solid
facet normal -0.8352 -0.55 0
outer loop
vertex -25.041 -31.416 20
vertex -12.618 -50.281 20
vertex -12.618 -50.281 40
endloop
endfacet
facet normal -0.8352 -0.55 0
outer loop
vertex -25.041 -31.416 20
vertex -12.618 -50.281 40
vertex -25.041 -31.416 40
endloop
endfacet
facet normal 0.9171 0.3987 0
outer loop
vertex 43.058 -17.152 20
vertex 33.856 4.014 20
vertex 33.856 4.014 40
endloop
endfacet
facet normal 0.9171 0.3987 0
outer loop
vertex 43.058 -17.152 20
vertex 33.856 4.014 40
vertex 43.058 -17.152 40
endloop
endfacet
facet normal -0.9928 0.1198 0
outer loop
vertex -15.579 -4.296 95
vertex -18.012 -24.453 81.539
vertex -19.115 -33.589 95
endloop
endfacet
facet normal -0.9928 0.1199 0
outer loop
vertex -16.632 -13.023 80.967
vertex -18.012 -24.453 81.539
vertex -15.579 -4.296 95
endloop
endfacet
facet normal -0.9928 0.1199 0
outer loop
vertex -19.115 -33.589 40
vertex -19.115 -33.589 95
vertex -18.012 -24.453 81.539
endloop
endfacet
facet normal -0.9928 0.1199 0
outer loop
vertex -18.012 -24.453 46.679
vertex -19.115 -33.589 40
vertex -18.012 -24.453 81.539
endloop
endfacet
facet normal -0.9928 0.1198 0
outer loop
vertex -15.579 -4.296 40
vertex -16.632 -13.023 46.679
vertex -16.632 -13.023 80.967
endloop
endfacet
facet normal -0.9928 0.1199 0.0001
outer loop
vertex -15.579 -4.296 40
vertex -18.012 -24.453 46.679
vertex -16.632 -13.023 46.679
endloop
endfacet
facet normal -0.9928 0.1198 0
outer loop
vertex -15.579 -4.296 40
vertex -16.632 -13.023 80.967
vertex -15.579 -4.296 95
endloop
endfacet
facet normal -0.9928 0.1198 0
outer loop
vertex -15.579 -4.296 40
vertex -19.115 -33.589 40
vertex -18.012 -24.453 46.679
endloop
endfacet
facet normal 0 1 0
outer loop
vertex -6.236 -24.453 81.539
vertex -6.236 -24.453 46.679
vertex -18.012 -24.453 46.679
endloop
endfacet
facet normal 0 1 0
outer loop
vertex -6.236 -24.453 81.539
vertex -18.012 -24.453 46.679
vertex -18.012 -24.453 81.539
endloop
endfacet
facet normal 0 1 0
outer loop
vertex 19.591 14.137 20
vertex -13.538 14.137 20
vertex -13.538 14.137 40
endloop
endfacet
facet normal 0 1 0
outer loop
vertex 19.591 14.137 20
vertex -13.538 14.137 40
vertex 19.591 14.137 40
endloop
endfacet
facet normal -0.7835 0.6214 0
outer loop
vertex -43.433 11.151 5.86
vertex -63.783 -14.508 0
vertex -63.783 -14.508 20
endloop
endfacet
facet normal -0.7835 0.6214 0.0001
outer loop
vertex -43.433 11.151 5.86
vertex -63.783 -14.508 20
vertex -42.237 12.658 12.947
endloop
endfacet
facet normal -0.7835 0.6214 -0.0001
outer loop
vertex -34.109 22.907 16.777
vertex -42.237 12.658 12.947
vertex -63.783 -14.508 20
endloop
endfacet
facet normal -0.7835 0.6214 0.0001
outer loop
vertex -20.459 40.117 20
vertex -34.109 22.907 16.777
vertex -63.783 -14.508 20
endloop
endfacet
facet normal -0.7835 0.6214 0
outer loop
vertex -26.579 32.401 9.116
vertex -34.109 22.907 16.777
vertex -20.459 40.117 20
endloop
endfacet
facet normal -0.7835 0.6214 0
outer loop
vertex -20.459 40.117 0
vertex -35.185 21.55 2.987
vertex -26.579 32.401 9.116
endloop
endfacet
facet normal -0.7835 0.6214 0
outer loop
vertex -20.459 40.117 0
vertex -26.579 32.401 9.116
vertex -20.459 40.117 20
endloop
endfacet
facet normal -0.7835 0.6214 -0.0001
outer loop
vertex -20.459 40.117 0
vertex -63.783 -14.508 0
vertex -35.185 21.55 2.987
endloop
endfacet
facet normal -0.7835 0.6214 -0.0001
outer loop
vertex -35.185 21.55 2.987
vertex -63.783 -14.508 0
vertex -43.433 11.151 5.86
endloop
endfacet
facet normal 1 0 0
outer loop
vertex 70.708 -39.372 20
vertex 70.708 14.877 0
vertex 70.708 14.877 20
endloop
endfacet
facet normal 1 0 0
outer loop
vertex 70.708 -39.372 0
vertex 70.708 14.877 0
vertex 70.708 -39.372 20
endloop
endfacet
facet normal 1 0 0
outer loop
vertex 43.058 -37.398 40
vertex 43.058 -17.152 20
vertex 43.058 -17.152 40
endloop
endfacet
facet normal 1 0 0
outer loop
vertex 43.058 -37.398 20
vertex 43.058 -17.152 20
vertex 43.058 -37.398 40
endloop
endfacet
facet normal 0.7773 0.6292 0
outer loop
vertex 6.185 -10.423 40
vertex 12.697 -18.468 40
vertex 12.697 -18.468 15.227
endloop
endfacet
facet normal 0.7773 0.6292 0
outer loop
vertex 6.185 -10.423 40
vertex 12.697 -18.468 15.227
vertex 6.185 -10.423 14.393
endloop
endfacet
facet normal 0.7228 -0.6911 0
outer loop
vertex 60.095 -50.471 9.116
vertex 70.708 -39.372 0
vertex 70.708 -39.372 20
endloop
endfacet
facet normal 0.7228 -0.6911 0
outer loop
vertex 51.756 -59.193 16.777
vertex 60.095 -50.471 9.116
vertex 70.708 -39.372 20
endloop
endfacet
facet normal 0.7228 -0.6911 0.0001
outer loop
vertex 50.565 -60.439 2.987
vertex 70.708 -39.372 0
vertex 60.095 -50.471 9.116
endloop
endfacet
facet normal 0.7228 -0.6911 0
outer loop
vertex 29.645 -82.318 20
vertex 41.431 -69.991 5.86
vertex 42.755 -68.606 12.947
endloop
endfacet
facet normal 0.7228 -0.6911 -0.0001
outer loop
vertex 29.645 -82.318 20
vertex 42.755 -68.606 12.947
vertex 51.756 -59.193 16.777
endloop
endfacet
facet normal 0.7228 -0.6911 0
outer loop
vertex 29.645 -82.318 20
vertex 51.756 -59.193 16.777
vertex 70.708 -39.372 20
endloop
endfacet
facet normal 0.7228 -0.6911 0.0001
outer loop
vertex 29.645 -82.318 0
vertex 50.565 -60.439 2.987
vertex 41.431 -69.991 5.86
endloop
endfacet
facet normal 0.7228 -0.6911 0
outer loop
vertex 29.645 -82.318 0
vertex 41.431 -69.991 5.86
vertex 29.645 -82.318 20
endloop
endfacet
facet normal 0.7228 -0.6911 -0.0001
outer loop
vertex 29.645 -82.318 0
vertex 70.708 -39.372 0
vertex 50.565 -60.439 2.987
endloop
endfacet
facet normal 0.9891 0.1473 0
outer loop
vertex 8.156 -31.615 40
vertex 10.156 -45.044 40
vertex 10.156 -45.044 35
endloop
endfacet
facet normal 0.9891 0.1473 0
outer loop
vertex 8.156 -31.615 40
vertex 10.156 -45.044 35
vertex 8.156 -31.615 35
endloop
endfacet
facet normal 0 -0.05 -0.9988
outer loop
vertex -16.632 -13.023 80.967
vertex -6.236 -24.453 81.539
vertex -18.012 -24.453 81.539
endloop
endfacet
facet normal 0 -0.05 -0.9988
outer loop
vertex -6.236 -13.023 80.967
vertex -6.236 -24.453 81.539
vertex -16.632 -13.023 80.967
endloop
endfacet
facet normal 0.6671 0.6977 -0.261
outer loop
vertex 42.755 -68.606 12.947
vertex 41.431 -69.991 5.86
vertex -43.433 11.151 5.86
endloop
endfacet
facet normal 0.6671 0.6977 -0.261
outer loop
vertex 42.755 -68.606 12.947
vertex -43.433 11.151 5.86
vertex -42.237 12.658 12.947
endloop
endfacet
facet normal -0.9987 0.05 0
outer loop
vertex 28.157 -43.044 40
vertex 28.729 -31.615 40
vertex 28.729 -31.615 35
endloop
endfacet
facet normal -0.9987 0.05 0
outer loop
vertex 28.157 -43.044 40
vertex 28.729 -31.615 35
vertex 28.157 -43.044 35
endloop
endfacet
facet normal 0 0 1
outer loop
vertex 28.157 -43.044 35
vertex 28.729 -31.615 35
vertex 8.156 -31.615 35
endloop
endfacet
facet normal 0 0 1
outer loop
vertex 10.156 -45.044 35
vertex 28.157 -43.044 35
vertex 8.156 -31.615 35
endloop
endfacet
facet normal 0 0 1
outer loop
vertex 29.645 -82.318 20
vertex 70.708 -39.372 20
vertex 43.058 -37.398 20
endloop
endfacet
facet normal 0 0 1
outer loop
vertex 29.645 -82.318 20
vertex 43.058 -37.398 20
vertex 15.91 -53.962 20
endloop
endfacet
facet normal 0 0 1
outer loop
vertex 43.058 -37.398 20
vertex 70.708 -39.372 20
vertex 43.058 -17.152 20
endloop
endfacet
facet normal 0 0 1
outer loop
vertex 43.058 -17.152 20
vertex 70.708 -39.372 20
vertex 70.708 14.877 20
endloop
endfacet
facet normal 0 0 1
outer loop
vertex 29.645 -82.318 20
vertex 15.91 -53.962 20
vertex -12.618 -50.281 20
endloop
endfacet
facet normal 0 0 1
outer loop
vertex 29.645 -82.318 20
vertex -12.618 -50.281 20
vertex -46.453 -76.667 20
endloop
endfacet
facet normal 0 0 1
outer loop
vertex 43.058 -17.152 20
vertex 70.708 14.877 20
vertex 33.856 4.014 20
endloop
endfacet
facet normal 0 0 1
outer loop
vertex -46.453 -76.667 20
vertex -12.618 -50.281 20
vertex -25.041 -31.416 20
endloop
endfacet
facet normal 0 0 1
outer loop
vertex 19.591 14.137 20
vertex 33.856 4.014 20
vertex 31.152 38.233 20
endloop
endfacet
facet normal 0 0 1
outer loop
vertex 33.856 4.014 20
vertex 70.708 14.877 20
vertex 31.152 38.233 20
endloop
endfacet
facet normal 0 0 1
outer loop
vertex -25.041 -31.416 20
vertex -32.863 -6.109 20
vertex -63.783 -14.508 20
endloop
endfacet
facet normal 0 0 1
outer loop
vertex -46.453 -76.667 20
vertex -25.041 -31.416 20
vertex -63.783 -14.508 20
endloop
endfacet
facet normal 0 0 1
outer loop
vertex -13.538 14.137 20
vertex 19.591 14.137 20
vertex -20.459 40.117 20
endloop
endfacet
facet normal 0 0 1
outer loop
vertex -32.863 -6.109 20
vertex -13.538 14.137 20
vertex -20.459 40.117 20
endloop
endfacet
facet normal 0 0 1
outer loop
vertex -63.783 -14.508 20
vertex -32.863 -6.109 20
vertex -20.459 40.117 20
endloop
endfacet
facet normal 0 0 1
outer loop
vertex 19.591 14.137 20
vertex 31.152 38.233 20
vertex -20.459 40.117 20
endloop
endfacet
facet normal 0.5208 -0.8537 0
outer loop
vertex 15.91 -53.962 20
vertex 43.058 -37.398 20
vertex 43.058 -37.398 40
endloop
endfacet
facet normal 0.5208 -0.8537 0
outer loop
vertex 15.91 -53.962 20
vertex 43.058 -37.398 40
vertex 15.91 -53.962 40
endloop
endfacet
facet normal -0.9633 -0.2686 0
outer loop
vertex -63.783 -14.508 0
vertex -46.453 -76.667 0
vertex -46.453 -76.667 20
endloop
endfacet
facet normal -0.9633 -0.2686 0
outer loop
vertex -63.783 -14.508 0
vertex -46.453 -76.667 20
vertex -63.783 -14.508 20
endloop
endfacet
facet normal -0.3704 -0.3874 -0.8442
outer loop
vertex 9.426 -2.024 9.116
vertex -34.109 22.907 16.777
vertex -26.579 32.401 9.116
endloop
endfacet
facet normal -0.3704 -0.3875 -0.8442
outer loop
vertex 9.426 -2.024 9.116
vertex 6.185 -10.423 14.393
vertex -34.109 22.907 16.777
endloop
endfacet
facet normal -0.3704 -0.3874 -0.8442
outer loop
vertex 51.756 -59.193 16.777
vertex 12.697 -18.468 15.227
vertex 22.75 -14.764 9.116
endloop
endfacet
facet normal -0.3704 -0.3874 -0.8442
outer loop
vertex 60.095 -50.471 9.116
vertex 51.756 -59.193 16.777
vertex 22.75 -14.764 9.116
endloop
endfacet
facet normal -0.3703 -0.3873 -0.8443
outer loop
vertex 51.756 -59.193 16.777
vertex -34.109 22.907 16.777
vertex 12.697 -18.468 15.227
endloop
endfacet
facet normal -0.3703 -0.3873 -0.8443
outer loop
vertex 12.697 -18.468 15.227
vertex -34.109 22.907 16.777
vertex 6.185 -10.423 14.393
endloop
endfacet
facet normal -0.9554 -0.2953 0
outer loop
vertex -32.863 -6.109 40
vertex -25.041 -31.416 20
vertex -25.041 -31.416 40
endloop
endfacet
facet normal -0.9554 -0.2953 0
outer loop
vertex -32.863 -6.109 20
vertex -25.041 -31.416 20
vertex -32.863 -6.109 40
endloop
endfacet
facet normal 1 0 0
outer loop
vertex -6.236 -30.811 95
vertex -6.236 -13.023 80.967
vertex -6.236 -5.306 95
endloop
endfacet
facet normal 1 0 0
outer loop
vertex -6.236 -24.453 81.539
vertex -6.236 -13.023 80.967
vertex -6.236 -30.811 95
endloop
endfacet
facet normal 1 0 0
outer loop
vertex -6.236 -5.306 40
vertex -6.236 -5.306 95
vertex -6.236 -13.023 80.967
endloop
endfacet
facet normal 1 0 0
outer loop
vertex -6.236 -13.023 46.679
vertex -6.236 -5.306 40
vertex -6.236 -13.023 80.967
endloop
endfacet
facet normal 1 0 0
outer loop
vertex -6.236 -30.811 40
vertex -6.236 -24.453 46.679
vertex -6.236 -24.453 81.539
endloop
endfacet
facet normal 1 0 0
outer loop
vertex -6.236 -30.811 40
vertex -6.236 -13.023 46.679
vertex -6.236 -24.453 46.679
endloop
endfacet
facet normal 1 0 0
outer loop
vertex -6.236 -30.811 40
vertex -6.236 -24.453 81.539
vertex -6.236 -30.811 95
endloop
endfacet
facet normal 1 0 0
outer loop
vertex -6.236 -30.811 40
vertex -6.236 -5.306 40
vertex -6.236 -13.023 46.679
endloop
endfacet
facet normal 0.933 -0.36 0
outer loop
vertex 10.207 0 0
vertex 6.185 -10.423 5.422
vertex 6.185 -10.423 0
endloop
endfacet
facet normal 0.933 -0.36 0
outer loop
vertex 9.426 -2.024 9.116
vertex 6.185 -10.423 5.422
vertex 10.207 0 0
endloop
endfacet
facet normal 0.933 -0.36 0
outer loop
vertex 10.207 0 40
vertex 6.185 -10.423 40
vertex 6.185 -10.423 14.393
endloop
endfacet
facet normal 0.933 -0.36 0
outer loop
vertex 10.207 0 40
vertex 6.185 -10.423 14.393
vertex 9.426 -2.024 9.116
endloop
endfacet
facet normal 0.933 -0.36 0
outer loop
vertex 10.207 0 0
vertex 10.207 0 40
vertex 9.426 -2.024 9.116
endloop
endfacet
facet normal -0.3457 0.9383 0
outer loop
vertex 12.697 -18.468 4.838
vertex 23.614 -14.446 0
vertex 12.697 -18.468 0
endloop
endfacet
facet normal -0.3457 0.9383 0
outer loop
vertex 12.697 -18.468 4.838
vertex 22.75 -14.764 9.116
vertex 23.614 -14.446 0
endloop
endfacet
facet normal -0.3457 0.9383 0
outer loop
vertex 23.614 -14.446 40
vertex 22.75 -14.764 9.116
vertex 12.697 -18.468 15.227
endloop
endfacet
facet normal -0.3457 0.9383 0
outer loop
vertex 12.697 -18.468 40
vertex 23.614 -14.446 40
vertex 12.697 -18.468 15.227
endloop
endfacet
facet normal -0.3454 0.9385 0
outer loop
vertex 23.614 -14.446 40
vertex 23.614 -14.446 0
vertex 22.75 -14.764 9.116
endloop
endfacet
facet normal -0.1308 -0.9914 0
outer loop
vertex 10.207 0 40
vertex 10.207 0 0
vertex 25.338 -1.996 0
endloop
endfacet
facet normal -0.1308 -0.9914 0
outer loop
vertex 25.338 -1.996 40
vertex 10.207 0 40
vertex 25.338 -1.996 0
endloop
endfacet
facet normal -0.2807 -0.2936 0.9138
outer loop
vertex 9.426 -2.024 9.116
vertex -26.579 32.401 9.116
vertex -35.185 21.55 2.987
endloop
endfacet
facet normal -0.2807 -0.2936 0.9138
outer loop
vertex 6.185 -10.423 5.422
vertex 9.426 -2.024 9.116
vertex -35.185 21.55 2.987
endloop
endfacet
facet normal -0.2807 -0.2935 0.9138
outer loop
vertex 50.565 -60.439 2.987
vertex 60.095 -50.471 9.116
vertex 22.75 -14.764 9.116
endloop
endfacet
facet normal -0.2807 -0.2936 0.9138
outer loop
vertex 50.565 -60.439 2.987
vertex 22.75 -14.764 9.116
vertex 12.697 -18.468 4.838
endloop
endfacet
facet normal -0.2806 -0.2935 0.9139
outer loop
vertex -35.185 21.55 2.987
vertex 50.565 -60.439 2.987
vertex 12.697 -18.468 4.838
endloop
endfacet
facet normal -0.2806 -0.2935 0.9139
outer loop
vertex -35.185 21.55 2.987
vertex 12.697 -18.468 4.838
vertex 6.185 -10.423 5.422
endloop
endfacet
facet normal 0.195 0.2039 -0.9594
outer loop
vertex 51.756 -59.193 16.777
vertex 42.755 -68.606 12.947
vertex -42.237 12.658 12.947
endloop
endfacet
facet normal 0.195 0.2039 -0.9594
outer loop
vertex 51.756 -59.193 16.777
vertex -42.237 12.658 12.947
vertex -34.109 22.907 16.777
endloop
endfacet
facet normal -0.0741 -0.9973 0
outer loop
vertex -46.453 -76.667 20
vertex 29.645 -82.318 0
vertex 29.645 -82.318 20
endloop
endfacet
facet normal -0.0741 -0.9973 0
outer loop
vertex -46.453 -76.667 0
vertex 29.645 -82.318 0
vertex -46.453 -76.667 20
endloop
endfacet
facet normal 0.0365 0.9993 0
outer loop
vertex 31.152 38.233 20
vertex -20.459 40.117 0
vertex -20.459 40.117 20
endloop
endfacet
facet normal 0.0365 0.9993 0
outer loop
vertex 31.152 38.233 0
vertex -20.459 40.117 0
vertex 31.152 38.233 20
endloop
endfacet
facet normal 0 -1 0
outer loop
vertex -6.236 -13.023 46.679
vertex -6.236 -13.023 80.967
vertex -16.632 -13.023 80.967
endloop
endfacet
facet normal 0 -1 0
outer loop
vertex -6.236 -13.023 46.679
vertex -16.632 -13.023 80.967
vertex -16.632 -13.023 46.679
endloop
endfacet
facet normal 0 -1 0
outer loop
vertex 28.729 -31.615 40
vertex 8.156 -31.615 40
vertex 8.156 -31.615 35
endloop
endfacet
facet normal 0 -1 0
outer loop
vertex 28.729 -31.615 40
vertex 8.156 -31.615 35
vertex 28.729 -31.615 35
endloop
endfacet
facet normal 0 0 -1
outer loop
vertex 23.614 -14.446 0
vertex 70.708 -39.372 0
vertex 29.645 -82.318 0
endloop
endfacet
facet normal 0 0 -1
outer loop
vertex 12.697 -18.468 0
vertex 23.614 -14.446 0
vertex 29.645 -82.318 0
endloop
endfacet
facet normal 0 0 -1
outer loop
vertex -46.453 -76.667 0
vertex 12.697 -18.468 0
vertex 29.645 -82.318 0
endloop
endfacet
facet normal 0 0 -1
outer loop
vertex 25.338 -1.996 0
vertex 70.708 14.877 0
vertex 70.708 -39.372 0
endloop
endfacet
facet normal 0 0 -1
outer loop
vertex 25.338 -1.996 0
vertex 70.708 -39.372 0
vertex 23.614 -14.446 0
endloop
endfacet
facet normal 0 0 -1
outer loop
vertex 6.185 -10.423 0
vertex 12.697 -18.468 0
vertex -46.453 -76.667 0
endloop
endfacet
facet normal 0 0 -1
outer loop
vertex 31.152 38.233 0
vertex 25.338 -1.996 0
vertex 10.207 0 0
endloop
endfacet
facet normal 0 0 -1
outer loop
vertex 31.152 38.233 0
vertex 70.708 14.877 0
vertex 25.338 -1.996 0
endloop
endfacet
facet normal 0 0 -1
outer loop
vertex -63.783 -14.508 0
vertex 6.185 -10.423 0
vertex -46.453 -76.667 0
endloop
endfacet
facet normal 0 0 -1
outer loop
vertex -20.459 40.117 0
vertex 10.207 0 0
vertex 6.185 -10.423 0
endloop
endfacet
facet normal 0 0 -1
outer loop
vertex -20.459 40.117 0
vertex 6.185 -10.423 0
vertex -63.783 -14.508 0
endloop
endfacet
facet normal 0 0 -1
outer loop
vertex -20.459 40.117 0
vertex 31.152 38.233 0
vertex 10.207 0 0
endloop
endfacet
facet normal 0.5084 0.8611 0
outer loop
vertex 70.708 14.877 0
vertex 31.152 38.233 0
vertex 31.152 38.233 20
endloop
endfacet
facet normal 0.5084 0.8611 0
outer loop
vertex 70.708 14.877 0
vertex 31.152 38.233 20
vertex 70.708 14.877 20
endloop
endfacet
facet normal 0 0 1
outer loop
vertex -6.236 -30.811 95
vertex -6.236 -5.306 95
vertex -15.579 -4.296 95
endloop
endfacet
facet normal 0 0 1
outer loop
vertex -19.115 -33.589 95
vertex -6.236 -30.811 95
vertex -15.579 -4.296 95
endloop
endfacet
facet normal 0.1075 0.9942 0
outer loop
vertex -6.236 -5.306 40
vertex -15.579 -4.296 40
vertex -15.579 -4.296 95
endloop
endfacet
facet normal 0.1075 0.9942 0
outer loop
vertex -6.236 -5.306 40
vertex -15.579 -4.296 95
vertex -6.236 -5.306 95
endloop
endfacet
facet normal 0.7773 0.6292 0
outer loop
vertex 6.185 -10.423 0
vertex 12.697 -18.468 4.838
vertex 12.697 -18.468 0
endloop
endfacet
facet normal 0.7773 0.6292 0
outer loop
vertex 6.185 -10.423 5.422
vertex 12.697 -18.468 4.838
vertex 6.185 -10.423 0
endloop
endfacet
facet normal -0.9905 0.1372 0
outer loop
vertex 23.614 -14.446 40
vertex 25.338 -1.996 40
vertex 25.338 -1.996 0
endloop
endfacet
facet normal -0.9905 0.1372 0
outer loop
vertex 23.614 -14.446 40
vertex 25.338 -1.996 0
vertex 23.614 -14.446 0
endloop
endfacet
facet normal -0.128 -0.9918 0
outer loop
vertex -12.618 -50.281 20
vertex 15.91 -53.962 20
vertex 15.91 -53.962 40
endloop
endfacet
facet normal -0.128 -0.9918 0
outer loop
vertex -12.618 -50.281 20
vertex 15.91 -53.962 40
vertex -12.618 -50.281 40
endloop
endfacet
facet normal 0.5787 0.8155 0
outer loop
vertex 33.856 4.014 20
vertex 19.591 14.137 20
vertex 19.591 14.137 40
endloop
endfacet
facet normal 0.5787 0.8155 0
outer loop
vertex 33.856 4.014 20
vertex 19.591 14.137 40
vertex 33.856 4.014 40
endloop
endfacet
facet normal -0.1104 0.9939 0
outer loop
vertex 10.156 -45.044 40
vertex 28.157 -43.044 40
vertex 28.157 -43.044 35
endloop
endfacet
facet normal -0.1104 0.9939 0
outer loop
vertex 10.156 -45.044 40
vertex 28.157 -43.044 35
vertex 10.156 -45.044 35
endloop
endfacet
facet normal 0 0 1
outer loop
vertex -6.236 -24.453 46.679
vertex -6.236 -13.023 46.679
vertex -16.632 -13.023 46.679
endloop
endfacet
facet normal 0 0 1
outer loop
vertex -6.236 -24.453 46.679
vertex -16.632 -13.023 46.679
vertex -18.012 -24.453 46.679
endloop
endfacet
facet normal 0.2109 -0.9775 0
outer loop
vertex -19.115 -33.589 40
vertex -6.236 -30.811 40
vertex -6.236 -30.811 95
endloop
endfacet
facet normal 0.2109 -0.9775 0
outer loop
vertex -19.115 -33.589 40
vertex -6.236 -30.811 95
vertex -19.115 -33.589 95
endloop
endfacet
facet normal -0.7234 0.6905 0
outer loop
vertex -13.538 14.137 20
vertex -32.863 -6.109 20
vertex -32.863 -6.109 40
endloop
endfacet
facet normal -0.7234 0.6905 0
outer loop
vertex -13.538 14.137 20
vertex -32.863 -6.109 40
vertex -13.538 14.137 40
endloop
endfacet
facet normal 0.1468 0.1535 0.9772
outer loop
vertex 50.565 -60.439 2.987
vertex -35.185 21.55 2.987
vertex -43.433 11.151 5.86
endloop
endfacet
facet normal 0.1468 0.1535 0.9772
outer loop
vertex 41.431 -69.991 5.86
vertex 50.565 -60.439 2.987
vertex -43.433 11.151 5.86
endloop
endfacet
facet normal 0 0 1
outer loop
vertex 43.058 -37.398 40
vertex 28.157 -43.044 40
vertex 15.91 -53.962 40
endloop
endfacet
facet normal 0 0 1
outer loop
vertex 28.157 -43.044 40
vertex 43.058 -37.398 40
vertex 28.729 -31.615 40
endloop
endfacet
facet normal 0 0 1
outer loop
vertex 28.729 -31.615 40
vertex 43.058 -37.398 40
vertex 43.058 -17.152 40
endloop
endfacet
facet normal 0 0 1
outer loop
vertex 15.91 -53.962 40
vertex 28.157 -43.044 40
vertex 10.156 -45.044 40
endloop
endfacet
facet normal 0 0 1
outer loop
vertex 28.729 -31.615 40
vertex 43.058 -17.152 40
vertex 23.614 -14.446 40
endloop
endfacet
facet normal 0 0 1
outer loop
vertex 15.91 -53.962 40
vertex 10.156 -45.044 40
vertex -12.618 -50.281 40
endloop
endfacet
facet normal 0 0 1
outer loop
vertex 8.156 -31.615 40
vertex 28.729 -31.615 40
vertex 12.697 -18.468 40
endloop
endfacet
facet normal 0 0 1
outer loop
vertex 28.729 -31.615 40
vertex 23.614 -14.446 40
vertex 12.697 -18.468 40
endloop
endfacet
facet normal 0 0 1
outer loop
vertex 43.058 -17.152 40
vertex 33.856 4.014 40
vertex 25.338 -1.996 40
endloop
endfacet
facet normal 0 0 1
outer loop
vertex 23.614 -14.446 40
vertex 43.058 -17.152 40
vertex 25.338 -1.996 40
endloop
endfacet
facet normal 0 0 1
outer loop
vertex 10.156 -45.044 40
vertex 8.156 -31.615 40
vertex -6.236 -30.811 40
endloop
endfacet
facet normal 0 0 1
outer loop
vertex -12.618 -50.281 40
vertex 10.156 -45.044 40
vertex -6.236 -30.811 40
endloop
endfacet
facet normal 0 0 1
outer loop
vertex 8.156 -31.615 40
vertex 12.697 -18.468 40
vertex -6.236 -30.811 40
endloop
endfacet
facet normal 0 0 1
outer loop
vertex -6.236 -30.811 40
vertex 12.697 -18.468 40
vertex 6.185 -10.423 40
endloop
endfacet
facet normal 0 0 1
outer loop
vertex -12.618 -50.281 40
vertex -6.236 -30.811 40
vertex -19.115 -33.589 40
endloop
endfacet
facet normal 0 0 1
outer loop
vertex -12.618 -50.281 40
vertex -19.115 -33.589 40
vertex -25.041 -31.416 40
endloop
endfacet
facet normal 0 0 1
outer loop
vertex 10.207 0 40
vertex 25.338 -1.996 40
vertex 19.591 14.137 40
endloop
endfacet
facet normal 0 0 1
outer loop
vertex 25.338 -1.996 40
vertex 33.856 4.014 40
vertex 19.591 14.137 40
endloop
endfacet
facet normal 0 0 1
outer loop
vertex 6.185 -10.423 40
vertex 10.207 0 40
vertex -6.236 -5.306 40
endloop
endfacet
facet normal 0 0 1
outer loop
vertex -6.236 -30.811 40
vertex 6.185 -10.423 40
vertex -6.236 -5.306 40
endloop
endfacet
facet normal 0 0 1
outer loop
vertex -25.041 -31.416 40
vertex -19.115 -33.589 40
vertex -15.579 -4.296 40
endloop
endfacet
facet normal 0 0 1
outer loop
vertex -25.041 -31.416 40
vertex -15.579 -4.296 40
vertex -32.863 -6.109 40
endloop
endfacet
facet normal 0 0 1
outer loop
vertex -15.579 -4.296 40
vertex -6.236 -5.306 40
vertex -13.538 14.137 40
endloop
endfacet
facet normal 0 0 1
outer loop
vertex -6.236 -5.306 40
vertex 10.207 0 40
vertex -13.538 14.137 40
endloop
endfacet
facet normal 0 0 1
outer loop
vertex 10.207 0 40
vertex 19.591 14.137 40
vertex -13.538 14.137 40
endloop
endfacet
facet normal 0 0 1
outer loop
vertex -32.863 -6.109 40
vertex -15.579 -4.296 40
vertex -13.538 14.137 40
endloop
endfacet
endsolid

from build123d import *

# Parameters (mm, degrees)
PAD_DEPTH       = 20
PAD001_DEPTH    = 20
PAD002_DEPTH    = 55
POCKET_DEPTH    = 5
POCKET001_DEPTH = 40.001
POCKET002_DEPTH = 57.547898
POCKET003_DEPTH = 152.1407019841


with BuildPart() as part:
    # Sketch → Pad (new body)
    with BuildSketch(Plane.XY):
        Polygon((-20.459476, 40.117115), (31.15163, 38.233494), (70.707581, 14.876653), (70.707581, -39.371517), (29.644735, -82.317986), (-46.453392, -76.667137), (-63.782669, -14.507775), align=None)
    extrude(amount=PAD_DEPTH)

    # Sketch001 (on Face9 of Pad) → Pad001 (join)
    with BuildSketch(Plane.XY.offset(20)):
        Polygon((-13.537989, 14.137136), (19.591442, 14.137136), (33.855503, 4.014249), (43.058121, -17.151772), (43.058121, -37.397533), (15.910392, -53.96225), (-12.617725, -50.281197), (-25.041264, -31.415821), (-32.863491, -6.108627), align=None)
    extrude(amount=PAD001_DEPTH)

    # Sketch002 (on Face19 of Pad001) → Pad002 (join)
    with BuildSketch(Plane.XY.offset(40)):
        Polygon((-15.579205, -4.296096), (-6.235771, -5.306198), (-6.235771, -30.811253), (-19.114557, -33.589027), align=None)
    extrude(amount=PAD002_DEPTH)

    # Sketch003 (on Face19 of Pad002) → Pocket (cut)
    with BuildSketch(Plane.XY.offset(40)):
        Polygon((8.155688, -31.614529), (28.728765, -31.614529), (28.157293, -43.044018), (10.155849, -45.044178), align=None)
    extrude(amount=-POCKET_DEPTH, mode=Mode.SUBTRACT)

    # Sketch004 (on Face19 of Pocket) → Pocket001 (cut, through all)
    with BuildSketch(Plane.XY.offset(40)):
        Polygon((10.206862, 0), (25.338156, -1.995884), (23.614338, -14.445684), (12.696822, -18.467928), (6.184619, -10.42344), align=None)
    extrude(amount=-POCKET001_DEPTH, mode=Mode.SUBTRACT)

    # Sketch005 (on Face32 of Pocket001) → Pocket002 (cut, through all)
    with BuildSketch(Plane.YZ.offset(-6.235771)):
        Polygon((-24.452877, 81.538773), (-13.023387, 80.9673), (-13.023387, 46.678833), (-24.452877, 46.678833), align=None)
    extrude(amount=-POCKET002_DEPTH, mode=Mode.SUBTRACT)

    # Sketch006 (on Face9 of Pocket002) → Pocket003 (cut, through all)
    with BuildSketch(Plane(origin=(56.60434605, -54.1216914662, 0), x_dir=(0.6910786275, 0.7227795865, 0), z_dir=(0.7227795865, -0.6910786275, 0))):
        Polygon((-20.040229, 12.946631), (-7.015827, 16.777342), (5.050909, 9.115925), (-8.739645, 2.986793), (-21.955589, 5.859823), align=None)
    extrude(amount=-POCKET003_DEPTH, mode=Mode.SUBTRACT)


solid = part.part
